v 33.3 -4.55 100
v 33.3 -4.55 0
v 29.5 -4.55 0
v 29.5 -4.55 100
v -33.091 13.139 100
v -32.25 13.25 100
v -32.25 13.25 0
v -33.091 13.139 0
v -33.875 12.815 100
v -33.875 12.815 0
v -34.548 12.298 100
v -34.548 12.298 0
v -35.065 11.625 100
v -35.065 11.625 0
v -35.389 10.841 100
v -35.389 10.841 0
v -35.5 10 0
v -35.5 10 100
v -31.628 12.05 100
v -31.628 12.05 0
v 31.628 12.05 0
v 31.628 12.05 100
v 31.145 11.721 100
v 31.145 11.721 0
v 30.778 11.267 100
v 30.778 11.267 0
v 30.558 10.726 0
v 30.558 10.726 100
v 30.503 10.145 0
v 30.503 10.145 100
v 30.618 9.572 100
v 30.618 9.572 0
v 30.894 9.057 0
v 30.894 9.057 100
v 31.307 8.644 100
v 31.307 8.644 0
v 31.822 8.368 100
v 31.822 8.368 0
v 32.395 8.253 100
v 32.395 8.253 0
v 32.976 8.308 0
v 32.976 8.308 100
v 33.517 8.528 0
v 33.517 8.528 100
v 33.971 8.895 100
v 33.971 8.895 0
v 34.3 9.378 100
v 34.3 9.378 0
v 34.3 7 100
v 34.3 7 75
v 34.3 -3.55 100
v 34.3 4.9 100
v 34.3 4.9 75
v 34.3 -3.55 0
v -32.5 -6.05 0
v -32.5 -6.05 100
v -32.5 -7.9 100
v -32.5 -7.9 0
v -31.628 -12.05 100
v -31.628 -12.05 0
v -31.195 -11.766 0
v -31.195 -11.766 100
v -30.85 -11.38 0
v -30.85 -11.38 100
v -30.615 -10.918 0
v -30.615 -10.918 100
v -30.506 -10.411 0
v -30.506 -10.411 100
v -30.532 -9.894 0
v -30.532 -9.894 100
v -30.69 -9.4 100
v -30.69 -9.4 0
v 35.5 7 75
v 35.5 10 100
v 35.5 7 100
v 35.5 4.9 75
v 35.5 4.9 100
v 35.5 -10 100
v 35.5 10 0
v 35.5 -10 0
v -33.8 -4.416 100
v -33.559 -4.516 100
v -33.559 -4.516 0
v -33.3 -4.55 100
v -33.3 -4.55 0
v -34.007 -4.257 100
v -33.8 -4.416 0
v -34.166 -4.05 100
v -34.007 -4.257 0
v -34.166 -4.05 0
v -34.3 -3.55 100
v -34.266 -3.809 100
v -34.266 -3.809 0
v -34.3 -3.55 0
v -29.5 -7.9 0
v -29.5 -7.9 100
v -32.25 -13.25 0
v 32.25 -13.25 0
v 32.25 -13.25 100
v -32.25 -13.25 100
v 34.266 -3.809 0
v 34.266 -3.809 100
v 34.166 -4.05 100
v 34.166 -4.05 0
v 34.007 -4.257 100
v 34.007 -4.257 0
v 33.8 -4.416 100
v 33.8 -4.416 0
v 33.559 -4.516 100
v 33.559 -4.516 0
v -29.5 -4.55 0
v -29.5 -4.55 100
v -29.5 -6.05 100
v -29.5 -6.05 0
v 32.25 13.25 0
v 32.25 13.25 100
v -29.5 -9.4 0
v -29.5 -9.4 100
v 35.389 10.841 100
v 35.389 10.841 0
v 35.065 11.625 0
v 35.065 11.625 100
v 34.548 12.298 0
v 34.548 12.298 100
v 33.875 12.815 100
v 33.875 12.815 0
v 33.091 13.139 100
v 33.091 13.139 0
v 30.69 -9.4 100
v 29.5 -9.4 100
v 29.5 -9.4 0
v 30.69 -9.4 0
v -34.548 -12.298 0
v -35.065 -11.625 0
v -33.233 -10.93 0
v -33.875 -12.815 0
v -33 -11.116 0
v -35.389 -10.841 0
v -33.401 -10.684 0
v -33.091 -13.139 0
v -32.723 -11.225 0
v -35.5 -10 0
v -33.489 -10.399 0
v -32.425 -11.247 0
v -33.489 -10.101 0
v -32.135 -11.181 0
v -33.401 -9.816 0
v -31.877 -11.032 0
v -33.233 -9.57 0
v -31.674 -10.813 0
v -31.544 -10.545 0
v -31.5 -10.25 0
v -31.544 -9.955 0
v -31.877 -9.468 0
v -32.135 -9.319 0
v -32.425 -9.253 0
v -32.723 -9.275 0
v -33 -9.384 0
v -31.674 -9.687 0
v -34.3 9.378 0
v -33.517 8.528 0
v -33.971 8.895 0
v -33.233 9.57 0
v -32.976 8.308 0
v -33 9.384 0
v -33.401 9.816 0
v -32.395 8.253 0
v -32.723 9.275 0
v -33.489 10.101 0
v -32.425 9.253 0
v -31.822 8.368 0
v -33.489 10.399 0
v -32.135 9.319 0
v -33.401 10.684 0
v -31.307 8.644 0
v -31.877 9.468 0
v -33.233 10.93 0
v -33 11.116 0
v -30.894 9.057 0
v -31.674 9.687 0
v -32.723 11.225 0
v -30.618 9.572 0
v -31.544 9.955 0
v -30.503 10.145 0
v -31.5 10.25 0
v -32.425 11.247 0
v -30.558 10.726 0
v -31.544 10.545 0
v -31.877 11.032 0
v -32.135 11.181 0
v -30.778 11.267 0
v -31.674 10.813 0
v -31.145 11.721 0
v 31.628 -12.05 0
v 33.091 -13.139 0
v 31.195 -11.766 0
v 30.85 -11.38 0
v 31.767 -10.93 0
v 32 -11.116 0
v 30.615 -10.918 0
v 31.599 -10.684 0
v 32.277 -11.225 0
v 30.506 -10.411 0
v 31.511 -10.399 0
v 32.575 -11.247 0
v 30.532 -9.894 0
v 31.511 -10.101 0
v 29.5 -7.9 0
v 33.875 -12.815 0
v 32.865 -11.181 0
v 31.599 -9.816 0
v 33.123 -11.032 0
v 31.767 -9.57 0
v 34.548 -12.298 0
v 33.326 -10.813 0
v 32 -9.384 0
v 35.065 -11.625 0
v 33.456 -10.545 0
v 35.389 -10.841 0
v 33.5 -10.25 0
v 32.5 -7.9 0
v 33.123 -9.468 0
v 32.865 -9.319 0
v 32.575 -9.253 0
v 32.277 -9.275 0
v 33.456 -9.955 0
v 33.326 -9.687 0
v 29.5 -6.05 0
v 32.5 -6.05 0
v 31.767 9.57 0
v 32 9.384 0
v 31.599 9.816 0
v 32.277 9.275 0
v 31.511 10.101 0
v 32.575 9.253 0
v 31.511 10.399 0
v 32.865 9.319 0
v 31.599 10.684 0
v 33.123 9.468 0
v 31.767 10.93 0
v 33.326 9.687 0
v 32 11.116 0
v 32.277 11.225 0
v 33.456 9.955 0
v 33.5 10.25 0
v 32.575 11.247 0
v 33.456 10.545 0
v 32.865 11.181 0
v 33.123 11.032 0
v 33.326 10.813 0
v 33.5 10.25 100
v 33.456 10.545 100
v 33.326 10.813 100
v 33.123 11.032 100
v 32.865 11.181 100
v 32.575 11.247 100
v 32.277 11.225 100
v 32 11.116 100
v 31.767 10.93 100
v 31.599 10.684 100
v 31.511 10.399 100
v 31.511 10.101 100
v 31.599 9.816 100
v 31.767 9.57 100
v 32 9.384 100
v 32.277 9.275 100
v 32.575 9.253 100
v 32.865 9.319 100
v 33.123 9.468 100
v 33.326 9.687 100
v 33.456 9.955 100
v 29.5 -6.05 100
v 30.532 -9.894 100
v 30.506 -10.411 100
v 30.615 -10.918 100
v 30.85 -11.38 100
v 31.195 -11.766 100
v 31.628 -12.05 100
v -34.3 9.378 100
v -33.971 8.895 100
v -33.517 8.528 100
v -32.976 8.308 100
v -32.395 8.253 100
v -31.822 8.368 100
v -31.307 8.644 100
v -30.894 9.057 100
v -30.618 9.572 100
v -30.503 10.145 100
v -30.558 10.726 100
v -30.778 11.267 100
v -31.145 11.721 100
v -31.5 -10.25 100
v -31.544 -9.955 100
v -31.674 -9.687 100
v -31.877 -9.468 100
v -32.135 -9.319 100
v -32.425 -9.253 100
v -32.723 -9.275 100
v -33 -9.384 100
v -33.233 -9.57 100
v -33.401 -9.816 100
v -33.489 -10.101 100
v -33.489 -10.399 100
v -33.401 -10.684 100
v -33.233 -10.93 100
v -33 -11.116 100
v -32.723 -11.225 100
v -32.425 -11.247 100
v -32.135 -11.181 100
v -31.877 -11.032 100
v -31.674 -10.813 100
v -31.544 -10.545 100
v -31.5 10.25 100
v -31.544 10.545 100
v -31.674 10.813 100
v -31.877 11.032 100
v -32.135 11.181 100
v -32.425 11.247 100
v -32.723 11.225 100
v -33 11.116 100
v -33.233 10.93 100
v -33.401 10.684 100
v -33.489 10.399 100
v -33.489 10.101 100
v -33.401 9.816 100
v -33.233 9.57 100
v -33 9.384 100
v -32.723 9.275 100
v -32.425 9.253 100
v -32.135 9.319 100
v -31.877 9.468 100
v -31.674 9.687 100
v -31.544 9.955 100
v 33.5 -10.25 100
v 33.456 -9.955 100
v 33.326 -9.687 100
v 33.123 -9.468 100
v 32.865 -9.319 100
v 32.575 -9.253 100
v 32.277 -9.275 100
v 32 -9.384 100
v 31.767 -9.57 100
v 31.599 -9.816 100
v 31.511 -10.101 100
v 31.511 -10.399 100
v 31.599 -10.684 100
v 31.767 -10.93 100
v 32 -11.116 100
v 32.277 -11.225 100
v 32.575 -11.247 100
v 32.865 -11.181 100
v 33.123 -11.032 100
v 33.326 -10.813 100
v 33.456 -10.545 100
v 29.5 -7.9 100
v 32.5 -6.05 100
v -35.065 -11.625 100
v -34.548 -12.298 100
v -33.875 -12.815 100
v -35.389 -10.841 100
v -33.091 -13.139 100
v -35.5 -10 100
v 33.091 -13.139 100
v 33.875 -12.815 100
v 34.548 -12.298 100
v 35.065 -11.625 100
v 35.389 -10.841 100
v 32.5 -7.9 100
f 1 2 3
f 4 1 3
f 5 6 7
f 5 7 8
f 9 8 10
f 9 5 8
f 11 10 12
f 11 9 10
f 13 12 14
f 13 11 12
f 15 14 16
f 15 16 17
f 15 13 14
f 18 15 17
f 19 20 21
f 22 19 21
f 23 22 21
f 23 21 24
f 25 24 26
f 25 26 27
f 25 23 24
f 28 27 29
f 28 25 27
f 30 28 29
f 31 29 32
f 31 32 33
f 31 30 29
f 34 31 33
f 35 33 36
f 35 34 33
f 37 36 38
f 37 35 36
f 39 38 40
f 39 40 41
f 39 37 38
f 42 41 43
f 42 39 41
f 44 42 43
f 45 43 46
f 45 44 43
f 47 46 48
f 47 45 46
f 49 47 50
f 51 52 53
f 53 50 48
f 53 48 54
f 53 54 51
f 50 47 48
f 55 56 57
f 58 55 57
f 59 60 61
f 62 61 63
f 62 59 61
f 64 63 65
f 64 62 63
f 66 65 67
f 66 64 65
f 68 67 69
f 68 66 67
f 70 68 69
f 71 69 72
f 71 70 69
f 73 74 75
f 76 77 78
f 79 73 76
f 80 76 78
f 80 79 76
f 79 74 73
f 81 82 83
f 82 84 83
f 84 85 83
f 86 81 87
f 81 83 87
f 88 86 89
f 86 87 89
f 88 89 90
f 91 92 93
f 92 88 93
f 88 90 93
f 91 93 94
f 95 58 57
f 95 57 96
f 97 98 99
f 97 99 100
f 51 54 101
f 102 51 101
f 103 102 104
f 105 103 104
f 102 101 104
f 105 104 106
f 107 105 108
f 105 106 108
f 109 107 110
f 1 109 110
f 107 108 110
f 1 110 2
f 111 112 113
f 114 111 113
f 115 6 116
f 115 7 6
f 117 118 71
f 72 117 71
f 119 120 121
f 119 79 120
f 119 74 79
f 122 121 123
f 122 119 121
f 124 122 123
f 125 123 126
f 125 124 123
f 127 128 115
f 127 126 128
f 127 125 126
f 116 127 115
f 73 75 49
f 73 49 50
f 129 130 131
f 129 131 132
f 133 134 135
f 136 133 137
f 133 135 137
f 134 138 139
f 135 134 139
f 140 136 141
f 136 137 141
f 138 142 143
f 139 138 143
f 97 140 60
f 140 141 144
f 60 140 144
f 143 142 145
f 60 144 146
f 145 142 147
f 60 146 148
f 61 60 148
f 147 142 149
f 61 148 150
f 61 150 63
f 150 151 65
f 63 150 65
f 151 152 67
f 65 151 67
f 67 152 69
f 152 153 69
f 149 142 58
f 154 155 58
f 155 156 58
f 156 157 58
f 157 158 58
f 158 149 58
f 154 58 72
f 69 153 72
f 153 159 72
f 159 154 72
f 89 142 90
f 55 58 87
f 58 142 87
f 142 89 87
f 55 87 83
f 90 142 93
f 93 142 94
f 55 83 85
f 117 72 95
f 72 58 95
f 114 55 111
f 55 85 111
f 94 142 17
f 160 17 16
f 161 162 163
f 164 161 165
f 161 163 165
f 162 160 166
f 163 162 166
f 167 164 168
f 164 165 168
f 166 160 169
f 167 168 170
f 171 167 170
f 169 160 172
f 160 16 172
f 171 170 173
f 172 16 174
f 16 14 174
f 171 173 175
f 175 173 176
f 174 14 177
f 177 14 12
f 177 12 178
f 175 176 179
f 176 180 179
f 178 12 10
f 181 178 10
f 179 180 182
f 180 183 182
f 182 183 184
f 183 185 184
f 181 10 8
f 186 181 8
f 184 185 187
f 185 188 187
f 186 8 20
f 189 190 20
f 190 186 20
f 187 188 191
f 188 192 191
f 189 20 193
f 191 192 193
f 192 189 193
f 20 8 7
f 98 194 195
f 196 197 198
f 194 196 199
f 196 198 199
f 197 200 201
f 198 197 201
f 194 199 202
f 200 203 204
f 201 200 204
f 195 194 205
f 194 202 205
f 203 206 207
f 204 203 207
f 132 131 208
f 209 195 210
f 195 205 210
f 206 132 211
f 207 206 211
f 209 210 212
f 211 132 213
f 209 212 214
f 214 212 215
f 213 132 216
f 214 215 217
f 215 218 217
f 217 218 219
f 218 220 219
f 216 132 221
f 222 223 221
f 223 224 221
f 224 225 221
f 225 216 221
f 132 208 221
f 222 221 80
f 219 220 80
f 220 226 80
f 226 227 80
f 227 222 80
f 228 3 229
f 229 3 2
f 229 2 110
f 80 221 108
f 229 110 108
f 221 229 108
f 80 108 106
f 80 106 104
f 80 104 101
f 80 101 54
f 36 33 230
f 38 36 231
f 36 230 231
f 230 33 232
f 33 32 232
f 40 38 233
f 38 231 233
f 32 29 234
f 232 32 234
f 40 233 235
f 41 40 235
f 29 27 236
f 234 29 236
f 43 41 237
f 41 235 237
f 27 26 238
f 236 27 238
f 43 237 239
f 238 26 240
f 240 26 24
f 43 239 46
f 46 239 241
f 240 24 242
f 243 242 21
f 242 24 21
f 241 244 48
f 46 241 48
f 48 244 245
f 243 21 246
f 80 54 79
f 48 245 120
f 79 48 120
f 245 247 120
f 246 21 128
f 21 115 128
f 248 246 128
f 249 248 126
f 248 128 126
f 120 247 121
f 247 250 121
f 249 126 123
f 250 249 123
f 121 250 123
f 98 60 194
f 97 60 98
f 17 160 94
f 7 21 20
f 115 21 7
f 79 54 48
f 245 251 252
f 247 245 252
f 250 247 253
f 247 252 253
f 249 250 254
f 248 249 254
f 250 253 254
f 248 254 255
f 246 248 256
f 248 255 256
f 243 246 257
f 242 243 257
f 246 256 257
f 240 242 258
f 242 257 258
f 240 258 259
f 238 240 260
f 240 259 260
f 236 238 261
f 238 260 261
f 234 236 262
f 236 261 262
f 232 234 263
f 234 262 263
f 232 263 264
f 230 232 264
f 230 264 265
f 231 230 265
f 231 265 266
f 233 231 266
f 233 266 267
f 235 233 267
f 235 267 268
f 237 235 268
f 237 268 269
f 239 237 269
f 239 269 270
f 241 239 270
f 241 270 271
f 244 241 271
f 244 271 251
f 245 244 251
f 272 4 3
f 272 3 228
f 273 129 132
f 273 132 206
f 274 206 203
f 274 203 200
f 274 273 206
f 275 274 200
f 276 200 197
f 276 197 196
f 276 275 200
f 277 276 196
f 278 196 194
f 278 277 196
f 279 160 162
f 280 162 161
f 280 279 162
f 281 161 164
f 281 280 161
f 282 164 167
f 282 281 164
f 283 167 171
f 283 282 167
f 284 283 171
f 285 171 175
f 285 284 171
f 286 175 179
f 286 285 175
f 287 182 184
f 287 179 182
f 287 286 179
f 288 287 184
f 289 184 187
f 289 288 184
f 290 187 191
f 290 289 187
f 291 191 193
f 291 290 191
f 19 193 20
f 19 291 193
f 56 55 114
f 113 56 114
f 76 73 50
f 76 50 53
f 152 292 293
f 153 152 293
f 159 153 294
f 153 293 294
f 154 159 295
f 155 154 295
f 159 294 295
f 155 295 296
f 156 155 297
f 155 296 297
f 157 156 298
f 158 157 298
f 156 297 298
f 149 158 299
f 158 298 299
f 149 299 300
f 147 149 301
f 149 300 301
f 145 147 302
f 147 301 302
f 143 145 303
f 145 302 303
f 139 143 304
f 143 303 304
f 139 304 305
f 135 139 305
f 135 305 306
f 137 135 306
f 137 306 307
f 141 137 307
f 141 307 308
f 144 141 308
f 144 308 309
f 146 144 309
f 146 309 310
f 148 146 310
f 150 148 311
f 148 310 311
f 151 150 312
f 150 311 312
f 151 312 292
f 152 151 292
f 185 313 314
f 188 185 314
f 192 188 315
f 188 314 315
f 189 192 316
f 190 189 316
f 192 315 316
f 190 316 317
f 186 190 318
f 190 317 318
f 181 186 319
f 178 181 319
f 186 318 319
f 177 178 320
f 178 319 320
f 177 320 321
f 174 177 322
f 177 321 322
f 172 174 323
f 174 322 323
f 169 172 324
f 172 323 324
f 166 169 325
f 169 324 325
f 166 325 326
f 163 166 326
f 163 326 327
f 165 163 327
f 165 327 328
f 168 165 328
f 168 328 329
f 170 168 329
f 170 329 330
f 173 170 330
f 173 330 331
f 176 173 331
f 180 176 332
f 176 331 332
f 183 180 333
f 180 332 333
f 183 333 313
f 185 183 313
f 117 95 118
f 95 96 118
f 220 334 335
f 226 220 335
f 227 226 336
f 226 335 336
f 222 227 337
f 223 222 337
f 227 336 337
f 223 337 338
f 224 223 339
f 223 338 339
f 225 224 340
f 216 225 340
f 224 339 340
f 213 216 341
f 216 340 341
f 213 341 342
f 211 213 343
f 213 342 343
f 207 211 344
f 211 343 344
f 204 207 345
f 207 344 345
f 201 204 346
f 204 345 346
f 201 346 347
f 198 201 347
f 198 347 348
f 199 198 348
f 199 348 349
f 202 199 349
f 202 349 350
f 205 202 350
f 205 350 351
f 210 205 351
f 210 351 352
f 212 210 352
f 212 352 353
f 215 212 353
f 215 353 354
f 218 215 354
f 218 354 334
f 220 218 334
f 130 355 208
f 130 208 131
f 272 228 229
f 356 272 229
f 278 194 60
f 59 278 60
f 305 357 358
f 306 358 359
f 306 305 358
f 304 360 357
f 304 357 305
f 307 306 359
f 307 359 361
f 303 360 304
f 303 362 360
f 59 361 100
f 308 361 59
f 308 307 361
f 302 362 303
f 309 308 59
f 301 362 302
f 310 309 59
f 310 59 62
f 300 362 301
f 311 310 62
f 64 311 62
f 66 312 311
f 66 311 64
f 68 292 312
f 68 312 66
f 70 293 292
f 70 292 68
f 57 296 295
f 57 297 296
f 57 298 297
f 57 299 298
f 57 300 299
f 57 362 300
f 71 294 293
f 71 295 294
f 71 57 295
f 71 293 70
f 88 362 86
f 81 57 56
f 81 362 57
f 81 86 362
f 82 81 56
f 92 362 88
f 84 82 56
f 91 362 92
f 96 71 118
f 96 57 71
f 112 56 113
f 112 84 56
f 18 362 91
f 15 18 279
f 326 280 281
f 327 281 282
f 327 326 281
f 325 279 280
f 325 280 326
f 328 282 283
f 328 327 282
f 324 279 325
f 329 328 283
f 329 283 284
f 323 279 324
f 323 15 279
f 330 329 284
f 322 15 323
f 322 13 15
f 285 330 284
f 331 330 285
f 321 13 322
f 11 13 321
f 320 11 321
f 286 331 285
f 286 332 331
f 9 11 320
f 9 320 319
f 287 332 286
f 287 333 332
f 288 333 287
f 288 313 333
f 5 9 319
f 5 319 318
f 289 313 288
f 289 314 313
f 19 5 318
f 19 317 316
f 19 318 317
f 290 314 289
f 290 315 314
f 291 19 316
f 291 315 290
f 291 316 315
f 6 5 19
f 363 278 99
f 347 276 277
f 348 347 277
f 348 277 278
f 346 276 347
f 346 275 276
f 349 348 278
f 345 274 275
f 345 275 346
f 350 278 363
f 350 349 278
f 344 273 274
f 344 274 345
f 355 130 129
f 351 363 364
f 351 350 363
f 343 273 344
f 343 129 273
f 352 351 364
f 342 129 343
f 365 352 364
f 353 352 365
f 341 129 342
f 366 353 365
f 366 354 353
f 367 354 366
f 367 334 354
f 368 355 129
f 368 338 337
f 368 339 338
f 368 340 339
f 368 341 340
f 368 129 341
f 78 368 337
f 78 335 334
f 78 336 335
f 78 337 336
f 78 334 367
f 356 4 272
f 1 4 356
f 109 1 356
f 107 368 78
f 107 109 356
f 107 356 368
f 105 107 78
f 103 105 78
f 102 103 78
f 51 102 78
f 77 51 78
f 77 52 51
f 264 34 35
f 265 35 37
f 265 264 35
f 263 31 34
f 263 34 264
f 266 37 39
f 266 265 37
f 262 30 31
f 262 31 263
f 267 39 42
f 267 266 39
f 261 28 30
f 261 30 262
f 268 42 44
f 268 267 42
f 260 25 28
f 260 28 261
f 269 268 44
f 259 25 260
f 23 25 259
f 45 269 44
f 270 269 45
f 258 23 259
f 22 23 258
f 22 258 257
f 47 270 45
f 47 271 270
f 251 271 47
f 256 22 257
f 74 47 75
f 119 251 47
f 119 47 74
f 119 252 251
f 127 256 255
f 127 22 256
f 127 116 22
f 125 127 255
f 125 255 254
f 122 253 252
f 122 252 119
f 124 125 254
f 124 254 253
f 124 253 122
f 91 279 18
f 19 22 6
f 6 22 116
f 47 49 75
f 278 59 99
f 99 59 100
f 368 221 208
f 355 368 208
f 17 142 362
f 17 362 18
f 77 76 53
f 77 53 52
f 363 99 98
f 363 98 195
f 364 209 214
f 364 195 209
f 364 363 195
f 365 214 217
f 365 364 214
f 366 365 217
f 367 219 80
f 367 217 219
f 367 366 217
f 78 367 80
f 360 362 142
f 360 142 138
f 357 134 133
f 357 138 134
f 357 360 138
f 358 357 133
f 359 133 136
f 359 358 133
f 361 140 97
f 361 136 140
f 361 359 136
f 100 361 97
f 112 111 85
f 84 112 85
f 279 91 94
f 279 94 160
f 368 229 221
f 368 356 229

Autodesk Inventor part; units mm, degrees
ref_plane "YZ Plane" through (0, 0, 0) normal (1, 0, 0) x (0, 1, 0)
ref_plane "XZ Plane" through (0, 0, 0) normal (0, 1, 0) x (-1, 0, 0)
ref_plane "XY Plane" through (0, 0, 0) normal (0, 0, 1) x (1, 0, 0)
sketch "Sketch1" plane through (0, 0, 0) normal (0, 0, 1) x (1, 0, 0)
  line L0 (-35.5, 13.25) -> (35.5, 13.25)
  line L1 (35.5, 13.25) -> (35.5, -13.25)
  line L2 (35.5, -13.25) -> (-35.5, -13.25)
  line L3 (-35.5, -13.25) -> (-35.5, 13.25)
  line L4 (-34.3, 12.05) -> (34.3, 12.05)
  line L5 (34.3, 12.05) -> (34.3, -12.05)
  line L6 (34.3, -12.05) -> (-34.3, -12.05)
  line L7 (-34.3, -12.05) -> (-34.3, 12.05)
  point P0 (0, 0)
  dimension "d0" = 71
  dimension "d1" = 26.5
  dimension "d2" = 35.5
  dimension "d3" = 13.25
  dimension "d4" = 1.2
  dimension "d5" = 1.2
  dimension "d6" = 1.2
  dimension "d7" = 1.2
extrude "Extrusion1" add sketch "Sketch1" along normal blind 100
fillet "Fillet1" radius 2 4 edges at (-34.3, 12.05, 50) (34.3, 12.05, 50) (34.3, -12.05, 50) (-34.3, -12.05, 50)
fillet "Fillet2" radius 3.25 4 edges at (-35.5, 13.25, 50) (-35.5, -13.25, 50) (35.5, -13.25, 50) (35.5, 13.25, 50)
sketch "Sketch2" plane through (0, 0, 100) normal (0, 0, 1) x (1, 0, 0)
  line L0 (-34.3, -10.05) -> (-34.3, 10.05) projected
  line L1 (-34.3, -7.9) -> (-31.3, -7.9)
  line L2 (-31.3, -7.9) -> (-31.3, -9.4)
  line L3 (-31.3, -9.4) -> (-34.3, -9.4)
  line L4 (-34.3, -9.4) -> (-34.3, -7.9)
  line L5 (34.3, 10.05) -> (34.3, -10.05) projected
  line L6 (34.3, -7.9) -> (31.3, -7.9)
  line L7 (31.3, -7.9) -> (31.3, -9.4)
  line L8 (31.3, -9.4) -> (34.3, -9.4)
  line L9 (34.3, -9.4) -> (34.3, -7.9)
  line L10 (-32.25, -13.25) -> (32.25, -13.25) projected
  line L11 (-34.3, -6.05) -> (-31.3, -6.05)
  line L12 (-31.3, -6.05) -> (-31.3, -4.55)
  line L13 (-31.3, -4.55) -> (-34.3, -4.55)
  line L14 (-34.3, -4.55) -> (-34.3, -6.05)
  line L15 (31.3, -6.05) -> (34.3, -6.05)
  line L16 (34.3, -6.05) -> (34.3, -4.55)
  line L17 (34.3, -4.55) -> (31.3, -4.55)
  line L18 (31.3, -4.55) -> (31.3, -6.05)
  point P0 (0, 0)
  dimension "d12" = 3.85
  dimension "d13" = 1.5
  dimension "d14" = 3
  dimension "d15" = 3
  dimension "d16" = 1.5
  dimension "d17" = 1.85
extrude "Extrusion2" add sketch "Sketch2" against normal blind 100
fillet "Fillet3" radius 1 4 edges at (-34.3, -4.55, 50) (-34.3, -9.4, 50) (34.3, -9.4, 50) (34.3, -4.55, 50)
sketch "Sketch3" plane through (0, 0, 100) normal (0, 0, 1) x (1, 0, 0)
  line L0 (32.25, 13.25) -> (-32.25, 13.25) projected
  line L1 (-35.5, 10) -> (-35.5, -10) projected
  line L2 (-32.25, -13.25) -> (32.25, -13.25) projected
  line L3 (35.5, -10) -> (35.5, 10) projected
  circle A0 centre (-32.5, 10.25) radius 2
  circle A1 centre (-32.5, -10.25) radius 2
  circle A2 centre (32.5, -10.25) radius 2
  circle A3 centre (32.5, 10.25) radius 2
  point P0 (0, 0)
  dimension "d21" = 3
  dimension "d22" = 3
  dimension "d23" = 3
  dimension "d24" = 3
  dimension "d25" = 3
  dimension "d26" = 3
  dimension "d27" = 3
  dimension "d28" = 3
  dimension "d29" = 4
  dimension "d30" = 4
  dimension "d31" = 4
  dimension "d32" = 4
extrude "Extrusion3" add sketch "Sketch3" against normal blind 100
sketch "Sketch4" plane through (0, 0, 100) normal (0, 0, 1) x (1, 0, 0)
  arc A0 (-34.3, 9.3782) -> (-31.6282, 12.05) centre (-32.5, 10.25) ccw projected
  arc A1 (31.6282, 12.05) -> (34.3, 9.3782) centre (32.5, 10.25) ccw projected
  arc A2 (31.3, -8.65) -> (31.6282, -12.05) centre (32.5, -10.25) ccw projected
  arc A3 (-31.6282, -12.05) -> (-31.3, -8.65) centre (-32.5, -10.25) ccw projected
  circle A4 centre (-32.5, 10.25) radius 1
  circle A5 centre (-32.5, -10.25) radius 1
  circle A6 centre (32.5, 10.25) radius 1
  circle A7 centre (32.5, -10.25) radius 1
  point P0 (0, 0)
  dimension "d35" = 2
  dimension "d36" = 2
  dimension "d37" = 2
  dimension "d38" = 2
extrude "Extrusion4" cut sketch "Sketch4" against normal blind 100
sketch "Sketch5" plane through (35.5, -10, 0) normal (1, 0, 0) x (0, 0, -1)
  line L0 (-100, 20) -> (-100, 0) projected
  line L1 (-100, 17) -> (-75, 17)
  line L2 (-75, 17) -> (-75, 14.9)
  line L3 (-75, 14.9) -> (-100, 14.9)
  line L4 (-100, 14.9) -> (-100, 17)
  line L5 (-100, 20) -> (0, 20) projected
  point P0 (0, 10)
  dimension "d41" = 2.1
  dimension "d42" = 3
  dimension "d43" = 25
extrude "Extrusion5" cut sketch "Sketch5" against normal blind 2
sketch "Sketch6" plane through (0, 0, 100) normal (0, 0, 1) x (1, 0, 0)
  line L0 (34.3, -6.05) -> (34.3, -7.9) projected
  line L1 (-34.3, -7.9) -> (-34.3, -6.05) projected
  line L2 (-31.3, -7.9) -> (-34.3, -7.9) projected
  line L3 (-31.3, -7.9) -> (-29.5, -7.9)
  line L4 (-29.5, -7.9) -> (-29.5, -9.4)
  line L5 (-29.5, -9.4) -> (-31.3, -9.4)
  line L6 (-31.3, -9.4) -> (-31.3, -7.9)
  line L7 (-31.3, -6.05) -> (-31.3, -4.55) projected
  line L8 (-31.3, -4.55) -> (-29.5, -4.55)
  line L9 (-29.5, -4.55) -> (-29.5, -6.05)
  line L10 (-29.5, -6.05) -> (-31.3, -6.05)
  line L11 (-31.3, -6.05) -> (-31.3, -4.55)
  line L12 (31.3, -4.55) -> (29.5, -4.55)
  line L13 (29.5, -4.55) -> (29.5, -6.05)
  line L14 (29.5, -6.05) -> (31.3, -6.05)
  line L15 (31.3, -6.05) -> (31.3, -4.55)
  line L16 (31.3, -7.9) -> (29.5, -7.9)
  line L17 (29.5, -7.9) -> (29.5, -9.4)
  line L18 (29.5, -9.4) -> (31.3, -9.4)
  line L19 (31.3, -9.4) -> (31.3, -7.9)
  line L20 (-31.3, -6.05) -> (-34.3, -6.05) projected
  line L21 (-34.3, -6.05) -> (-32.5, -6.05)
  line L22 (-32.5, -6.05) -> (-32.5, -7.9)
  line L23 (-32.5, -7.9) -> (-34.3, -7.9)
  line L24 (-34.3, -7.9) -> (-34.3, -6.05)
  line L25 (34.3, -6.05) -> (31.3, -6.05) projected
  line L26 (31.3, -7.9) -> (34.3, -7.9) projected
  line L27 (34.3, -6.05) -> (32.5, -6.05)
  line L28 (32.5, -6.05) -> (32.5, -7.9)
  line L29 (32.5, -7.9) -> (34.3, -7.9)
  line L30 (34.3, -7.9) -> (34.3, -6.05)
  point P0 (0, 0)
  dimension "d46" = 68.6
  dimension "d47" = 65
  dimension "d48" = 1.8
  dimension "d49" = 1.8
  dimension "d50" = 3
  dimension "d51" = 1.5
  dimension "d52" = 3
extrude "Extrusion6" add sketch "Sketch6" against normal blind 100
sketch "Sketch7" plane through (0, 0, 100) normal (0, 0, 1) x (1, 0, 0)
  line L0 (-32.25, -13.25) -> (32.25, -13.25) projected
  line L1 (32.25, 13.25) -> (-32.25, 13.25) projected
  line L2 (35.5, -10) -> (35.5, 4.9) projected
  line L3 (-35.5, 10) -> (-35.5, -10) projected
  point P0 (0, 0)
  dimension "d55" = 26.5
  dimension "d56" = 71
properties part number "case"
